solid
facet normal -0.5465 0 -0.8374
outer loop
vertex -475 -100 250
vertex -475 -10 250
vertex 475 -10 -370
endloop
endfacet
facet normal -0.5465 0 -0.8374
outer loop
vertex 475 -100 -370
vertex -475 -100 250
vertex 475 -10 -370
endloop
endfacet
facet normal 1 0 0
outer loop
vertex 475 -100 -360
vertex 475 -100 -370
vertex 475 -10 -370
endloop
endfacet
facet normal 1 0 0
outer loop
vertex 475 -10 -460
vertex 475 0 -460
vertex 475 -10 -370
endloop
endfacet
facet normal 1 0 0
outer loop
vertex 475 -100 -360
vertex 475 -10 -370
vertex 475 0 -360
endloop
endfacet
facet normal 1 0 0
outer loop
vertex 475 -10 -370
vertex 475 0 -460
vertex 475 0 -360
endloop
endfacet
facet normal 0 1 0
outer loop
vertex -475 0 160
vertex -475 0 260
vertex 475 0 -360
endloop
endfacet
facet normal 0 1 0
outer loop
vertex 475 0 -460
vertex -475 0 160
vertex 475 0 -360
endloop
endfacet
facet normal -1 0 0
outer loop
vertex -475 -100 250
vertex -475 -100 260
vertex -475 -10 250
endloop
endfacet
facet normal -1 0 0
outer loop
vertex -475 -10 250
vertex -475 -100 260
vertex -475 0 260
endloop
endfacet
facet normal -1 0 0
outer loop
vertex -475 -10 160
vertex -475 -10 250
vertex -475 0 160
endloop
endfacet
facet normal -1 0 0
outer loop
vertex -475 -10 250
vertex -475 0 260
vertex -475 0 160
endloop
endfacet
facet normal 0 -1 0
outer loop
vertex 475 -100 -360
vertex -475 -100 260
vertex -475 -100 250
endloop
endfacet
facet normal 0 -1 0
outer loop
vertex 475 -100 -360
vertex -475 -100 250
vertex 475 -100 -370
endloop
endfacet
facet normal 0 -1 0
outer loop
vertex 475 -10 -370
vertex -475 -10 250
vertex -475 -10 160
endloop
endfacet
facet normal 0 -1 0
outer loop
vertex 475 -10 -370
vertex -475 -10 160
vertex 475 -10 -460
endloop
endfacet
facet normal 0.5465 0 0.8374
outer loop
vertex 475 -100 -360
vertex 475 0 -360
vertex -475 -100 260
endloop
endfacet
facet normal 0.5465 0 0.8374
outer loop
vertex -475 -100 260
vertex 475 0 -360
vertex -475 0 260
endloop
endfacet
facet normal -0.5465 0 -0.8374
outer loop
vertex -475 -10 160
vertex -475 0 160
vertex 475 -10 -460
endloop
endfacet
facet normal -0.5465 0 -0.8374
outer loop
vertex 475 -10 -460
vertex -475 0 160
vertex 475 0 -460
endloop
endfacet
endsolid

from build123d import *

# Parameters (mm, degrees)
F1_DEPTH = 10
F3_DEPTH = 90


with BuildPart() as f1:
    # F0 (on Front) → F1 (new body)
    with BuildSketch(Plane.XZ):
        Polygon((475, -360), (-475, 260), (-475, 160), (475, -460), align=None)
    extrude(amount=F1_DEPTH)

    # F2 (on face) → F3 (join)
    with BuildSketch(Plane.XZ.offset(10)):
        Polygon((475, -360), (-475, 260), (-475, 250), (475, -370), align=None)
    extrude(amount=F3_DEPTH)


solid = f1.part
